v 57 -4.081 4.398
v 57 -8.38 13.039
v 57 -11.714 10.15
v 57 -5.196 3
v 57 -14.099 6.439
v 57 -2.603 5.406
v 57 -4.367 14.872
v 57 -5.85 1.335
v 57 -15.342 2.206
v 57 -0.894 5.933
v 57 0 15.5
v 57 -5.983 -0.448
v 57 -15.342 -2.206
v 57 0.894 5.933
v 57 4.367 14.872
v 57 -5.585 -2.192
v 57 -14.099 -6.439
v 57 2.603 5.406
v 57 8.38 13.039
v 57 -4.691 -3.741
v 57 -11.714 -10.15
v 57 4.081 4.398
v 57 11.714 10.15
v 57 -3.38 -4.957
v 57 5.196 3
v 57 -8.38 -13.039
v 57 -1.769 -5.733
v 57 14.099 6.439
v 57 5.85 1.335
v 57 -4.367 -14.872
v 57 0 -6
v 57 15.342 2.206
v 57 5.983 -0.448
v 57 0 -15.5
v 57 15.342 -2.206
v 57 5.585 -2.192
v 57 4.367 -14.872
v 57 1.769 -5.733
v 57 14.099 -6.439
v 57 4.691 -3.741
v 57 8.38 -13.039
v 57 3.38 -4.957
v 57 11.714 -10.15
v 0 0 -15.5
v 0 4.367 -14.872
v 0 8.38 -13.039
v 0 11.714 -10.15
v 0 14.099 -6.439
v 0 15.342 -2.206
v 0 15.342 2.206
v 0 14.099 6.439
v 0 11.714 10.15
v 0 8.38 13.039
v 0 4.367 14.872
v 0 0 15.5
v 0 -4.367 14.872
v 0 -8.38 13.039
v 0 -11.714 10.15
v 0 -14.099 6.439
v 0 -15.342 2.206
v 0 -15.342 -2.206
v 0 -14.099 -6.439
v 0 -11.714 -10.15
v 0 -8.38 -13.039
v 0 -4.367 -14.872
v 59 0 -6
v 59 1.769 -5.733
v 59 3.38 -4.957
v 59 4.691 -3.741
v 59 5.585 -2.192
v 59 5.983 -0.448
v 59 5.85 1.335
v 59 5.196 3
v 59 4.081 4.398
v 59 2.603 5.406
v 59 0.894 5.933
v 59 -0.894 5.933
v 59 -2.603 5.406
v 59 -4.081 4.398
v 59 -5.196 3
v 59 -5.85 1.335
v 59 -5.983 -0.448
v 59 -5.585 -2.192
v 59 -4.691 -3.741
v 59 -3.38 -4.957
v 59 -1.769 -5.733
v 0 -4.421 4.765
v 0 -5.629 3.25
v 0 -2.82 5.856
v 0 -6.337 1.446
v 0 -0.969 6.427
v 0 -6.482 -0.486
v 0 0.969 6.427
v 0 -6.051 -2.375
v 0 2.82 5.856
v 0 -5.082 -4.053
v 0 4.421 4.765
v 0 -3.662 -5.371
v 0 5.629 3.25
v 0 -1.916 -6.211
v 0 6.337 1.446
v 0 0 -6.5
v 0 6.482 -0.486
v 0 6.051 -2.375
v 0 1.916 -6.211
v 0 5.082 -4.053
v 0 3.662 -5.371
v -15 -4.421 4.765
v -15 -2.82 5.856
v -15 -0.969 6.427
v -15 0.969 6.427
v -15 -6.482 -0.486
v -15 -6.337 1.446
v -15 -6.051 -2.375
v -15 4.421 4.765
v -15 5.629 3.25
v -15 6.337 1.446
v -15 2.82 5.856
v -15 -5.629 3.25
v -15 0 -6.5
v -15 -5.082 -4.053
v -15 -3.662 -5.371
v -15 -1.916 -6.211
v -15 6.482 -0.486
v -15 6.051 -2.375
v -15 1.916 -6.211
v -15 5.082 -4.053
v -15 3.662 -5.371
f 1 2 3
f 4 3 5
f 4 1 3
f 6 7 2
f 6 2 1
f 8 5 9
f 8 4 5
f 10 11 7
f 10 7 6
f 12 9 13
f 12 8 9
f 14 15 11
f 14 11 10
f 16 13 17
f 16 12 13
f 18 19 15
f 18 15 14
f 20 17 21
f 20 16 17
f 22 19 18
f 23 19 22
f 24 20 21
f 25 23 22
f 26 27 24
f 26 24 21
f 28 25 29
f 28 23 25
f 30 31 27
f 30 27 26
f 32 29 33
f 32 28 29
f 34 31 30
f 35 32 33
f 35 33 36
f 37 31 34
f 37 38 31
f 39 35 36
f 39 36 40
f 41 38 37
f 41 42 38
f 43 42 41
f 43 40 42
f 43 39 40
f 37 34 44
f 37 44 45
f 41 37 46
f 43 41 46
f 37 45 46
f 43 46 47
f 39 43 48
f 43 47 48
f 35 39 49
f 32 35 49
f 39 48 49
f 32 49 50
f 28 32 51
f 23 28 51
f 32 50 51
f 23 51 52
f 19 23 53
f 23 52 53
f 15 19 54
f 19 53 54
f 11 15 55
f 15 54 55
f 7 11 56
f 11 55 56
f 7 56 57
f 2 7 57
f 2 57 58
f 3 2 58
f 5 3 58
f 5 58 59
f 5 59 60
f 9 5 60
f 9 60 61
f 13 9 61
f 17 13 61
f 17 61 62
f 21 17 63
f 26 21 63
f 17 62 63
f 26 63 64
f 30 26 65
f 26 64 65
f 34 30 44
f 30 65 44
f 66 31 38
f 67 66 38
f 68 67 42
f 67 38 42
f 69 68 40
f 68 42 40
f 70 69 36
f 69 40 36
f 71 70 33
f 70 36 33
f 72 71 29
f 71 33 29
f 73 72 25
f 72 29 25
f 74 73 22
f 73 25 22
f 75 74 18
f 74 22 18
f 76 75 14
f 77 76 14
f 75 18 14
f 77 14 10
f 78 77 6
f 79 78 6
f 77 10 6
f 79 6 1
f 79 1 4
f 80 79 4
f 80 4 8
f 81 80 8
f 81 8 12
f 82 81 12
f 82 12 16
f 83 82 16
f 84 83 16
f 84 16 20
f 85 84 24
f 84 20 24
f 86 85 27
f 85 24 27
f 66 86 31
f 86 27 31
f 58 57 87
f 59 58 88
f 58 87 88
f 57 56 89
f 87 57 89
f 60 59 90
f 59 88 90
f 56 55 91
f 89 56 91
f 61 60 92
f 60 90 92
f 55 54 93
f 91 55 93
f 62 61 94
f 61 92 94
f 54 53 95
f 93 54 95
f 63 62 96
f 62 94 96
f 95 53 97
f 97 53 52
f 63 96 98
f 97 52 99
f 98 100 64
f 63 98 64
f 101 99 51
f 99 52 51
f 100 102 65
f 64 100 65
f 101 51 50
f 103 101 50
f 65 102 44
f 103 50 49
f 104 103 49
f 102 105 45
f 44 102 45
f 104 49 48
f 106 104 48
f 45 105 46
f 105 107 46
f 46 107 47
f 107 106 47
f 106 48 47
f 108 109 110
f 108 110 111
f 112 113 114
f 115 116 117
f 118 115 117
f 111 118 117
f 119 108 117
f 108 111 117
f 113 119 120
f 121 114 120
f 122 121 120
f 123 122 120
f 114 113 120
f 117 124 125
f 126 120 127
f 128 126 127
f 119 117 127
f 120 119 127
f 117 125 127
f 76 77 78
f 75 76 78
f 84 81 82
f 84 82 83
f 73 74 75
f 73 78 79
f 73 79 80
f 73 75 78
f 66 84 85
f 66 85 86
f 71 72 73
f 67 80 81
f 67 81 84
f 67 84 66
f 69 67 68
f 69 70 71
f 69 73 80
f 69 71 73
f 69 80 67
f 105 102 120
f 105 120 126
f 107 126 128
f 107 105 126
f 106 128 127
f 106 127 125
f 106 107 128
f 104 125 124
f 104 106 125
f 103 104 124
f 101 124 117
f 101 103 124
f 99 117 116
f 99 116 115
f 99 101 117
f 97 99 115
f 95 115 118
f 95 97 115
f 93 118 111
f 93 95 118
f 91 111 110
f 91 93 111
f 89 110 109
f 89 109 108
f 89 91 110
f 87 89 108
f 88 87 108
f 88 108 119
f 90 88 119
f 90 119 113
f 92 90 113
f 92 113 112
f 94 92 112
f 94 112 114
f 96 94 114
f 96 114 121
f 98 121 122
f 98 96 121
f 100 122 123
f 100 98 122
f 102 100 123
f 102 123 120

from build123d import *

# Parameters (mm, degrees)
SKETCH_1_R      = 15.5
EXTRUDE_1_DEPTH = 57
SKETCH_2_R      = 6.5
EXTRUDE_2_DEPTH = 15
SKETCH_3_R      = 6
EXTRUDE_3_DEPTH = 2


with BuildPart() as part:
    # 草图1 → 凸台-拉伸1 (new body)
    with BuildSketch(Plane(origin=(0, 0, 0), x_dir=(0, 0, -1), z_dir=(1, 0, 0))):
        Circle(SKETCH_1_R)
    extrude(amount=EXTRUDE_1_DEPTH)

    # 草图2 → 凸台-拉伸2 (add)
    with BuildSketch(Plane(origin=(0, 0, 0), x_dir=(0, 0, -1), z_dir=(1, 0, 0))):
        Circle(SKETCH_2_R)
    extrude(amount=-EXTRUDE_2_DEPTH)

    # 草图3 → 凸台-拉伸3 (add)
    with BuildSketch(Plane(origin=(57, 0, 0), x_dir=(0, 0, -1), z_dir=(1, 0, 0))):
        Circle(SKETCH_3_R)
    extrude(amount=EXTRUDE_3_DEPTH)


solid = part.part
